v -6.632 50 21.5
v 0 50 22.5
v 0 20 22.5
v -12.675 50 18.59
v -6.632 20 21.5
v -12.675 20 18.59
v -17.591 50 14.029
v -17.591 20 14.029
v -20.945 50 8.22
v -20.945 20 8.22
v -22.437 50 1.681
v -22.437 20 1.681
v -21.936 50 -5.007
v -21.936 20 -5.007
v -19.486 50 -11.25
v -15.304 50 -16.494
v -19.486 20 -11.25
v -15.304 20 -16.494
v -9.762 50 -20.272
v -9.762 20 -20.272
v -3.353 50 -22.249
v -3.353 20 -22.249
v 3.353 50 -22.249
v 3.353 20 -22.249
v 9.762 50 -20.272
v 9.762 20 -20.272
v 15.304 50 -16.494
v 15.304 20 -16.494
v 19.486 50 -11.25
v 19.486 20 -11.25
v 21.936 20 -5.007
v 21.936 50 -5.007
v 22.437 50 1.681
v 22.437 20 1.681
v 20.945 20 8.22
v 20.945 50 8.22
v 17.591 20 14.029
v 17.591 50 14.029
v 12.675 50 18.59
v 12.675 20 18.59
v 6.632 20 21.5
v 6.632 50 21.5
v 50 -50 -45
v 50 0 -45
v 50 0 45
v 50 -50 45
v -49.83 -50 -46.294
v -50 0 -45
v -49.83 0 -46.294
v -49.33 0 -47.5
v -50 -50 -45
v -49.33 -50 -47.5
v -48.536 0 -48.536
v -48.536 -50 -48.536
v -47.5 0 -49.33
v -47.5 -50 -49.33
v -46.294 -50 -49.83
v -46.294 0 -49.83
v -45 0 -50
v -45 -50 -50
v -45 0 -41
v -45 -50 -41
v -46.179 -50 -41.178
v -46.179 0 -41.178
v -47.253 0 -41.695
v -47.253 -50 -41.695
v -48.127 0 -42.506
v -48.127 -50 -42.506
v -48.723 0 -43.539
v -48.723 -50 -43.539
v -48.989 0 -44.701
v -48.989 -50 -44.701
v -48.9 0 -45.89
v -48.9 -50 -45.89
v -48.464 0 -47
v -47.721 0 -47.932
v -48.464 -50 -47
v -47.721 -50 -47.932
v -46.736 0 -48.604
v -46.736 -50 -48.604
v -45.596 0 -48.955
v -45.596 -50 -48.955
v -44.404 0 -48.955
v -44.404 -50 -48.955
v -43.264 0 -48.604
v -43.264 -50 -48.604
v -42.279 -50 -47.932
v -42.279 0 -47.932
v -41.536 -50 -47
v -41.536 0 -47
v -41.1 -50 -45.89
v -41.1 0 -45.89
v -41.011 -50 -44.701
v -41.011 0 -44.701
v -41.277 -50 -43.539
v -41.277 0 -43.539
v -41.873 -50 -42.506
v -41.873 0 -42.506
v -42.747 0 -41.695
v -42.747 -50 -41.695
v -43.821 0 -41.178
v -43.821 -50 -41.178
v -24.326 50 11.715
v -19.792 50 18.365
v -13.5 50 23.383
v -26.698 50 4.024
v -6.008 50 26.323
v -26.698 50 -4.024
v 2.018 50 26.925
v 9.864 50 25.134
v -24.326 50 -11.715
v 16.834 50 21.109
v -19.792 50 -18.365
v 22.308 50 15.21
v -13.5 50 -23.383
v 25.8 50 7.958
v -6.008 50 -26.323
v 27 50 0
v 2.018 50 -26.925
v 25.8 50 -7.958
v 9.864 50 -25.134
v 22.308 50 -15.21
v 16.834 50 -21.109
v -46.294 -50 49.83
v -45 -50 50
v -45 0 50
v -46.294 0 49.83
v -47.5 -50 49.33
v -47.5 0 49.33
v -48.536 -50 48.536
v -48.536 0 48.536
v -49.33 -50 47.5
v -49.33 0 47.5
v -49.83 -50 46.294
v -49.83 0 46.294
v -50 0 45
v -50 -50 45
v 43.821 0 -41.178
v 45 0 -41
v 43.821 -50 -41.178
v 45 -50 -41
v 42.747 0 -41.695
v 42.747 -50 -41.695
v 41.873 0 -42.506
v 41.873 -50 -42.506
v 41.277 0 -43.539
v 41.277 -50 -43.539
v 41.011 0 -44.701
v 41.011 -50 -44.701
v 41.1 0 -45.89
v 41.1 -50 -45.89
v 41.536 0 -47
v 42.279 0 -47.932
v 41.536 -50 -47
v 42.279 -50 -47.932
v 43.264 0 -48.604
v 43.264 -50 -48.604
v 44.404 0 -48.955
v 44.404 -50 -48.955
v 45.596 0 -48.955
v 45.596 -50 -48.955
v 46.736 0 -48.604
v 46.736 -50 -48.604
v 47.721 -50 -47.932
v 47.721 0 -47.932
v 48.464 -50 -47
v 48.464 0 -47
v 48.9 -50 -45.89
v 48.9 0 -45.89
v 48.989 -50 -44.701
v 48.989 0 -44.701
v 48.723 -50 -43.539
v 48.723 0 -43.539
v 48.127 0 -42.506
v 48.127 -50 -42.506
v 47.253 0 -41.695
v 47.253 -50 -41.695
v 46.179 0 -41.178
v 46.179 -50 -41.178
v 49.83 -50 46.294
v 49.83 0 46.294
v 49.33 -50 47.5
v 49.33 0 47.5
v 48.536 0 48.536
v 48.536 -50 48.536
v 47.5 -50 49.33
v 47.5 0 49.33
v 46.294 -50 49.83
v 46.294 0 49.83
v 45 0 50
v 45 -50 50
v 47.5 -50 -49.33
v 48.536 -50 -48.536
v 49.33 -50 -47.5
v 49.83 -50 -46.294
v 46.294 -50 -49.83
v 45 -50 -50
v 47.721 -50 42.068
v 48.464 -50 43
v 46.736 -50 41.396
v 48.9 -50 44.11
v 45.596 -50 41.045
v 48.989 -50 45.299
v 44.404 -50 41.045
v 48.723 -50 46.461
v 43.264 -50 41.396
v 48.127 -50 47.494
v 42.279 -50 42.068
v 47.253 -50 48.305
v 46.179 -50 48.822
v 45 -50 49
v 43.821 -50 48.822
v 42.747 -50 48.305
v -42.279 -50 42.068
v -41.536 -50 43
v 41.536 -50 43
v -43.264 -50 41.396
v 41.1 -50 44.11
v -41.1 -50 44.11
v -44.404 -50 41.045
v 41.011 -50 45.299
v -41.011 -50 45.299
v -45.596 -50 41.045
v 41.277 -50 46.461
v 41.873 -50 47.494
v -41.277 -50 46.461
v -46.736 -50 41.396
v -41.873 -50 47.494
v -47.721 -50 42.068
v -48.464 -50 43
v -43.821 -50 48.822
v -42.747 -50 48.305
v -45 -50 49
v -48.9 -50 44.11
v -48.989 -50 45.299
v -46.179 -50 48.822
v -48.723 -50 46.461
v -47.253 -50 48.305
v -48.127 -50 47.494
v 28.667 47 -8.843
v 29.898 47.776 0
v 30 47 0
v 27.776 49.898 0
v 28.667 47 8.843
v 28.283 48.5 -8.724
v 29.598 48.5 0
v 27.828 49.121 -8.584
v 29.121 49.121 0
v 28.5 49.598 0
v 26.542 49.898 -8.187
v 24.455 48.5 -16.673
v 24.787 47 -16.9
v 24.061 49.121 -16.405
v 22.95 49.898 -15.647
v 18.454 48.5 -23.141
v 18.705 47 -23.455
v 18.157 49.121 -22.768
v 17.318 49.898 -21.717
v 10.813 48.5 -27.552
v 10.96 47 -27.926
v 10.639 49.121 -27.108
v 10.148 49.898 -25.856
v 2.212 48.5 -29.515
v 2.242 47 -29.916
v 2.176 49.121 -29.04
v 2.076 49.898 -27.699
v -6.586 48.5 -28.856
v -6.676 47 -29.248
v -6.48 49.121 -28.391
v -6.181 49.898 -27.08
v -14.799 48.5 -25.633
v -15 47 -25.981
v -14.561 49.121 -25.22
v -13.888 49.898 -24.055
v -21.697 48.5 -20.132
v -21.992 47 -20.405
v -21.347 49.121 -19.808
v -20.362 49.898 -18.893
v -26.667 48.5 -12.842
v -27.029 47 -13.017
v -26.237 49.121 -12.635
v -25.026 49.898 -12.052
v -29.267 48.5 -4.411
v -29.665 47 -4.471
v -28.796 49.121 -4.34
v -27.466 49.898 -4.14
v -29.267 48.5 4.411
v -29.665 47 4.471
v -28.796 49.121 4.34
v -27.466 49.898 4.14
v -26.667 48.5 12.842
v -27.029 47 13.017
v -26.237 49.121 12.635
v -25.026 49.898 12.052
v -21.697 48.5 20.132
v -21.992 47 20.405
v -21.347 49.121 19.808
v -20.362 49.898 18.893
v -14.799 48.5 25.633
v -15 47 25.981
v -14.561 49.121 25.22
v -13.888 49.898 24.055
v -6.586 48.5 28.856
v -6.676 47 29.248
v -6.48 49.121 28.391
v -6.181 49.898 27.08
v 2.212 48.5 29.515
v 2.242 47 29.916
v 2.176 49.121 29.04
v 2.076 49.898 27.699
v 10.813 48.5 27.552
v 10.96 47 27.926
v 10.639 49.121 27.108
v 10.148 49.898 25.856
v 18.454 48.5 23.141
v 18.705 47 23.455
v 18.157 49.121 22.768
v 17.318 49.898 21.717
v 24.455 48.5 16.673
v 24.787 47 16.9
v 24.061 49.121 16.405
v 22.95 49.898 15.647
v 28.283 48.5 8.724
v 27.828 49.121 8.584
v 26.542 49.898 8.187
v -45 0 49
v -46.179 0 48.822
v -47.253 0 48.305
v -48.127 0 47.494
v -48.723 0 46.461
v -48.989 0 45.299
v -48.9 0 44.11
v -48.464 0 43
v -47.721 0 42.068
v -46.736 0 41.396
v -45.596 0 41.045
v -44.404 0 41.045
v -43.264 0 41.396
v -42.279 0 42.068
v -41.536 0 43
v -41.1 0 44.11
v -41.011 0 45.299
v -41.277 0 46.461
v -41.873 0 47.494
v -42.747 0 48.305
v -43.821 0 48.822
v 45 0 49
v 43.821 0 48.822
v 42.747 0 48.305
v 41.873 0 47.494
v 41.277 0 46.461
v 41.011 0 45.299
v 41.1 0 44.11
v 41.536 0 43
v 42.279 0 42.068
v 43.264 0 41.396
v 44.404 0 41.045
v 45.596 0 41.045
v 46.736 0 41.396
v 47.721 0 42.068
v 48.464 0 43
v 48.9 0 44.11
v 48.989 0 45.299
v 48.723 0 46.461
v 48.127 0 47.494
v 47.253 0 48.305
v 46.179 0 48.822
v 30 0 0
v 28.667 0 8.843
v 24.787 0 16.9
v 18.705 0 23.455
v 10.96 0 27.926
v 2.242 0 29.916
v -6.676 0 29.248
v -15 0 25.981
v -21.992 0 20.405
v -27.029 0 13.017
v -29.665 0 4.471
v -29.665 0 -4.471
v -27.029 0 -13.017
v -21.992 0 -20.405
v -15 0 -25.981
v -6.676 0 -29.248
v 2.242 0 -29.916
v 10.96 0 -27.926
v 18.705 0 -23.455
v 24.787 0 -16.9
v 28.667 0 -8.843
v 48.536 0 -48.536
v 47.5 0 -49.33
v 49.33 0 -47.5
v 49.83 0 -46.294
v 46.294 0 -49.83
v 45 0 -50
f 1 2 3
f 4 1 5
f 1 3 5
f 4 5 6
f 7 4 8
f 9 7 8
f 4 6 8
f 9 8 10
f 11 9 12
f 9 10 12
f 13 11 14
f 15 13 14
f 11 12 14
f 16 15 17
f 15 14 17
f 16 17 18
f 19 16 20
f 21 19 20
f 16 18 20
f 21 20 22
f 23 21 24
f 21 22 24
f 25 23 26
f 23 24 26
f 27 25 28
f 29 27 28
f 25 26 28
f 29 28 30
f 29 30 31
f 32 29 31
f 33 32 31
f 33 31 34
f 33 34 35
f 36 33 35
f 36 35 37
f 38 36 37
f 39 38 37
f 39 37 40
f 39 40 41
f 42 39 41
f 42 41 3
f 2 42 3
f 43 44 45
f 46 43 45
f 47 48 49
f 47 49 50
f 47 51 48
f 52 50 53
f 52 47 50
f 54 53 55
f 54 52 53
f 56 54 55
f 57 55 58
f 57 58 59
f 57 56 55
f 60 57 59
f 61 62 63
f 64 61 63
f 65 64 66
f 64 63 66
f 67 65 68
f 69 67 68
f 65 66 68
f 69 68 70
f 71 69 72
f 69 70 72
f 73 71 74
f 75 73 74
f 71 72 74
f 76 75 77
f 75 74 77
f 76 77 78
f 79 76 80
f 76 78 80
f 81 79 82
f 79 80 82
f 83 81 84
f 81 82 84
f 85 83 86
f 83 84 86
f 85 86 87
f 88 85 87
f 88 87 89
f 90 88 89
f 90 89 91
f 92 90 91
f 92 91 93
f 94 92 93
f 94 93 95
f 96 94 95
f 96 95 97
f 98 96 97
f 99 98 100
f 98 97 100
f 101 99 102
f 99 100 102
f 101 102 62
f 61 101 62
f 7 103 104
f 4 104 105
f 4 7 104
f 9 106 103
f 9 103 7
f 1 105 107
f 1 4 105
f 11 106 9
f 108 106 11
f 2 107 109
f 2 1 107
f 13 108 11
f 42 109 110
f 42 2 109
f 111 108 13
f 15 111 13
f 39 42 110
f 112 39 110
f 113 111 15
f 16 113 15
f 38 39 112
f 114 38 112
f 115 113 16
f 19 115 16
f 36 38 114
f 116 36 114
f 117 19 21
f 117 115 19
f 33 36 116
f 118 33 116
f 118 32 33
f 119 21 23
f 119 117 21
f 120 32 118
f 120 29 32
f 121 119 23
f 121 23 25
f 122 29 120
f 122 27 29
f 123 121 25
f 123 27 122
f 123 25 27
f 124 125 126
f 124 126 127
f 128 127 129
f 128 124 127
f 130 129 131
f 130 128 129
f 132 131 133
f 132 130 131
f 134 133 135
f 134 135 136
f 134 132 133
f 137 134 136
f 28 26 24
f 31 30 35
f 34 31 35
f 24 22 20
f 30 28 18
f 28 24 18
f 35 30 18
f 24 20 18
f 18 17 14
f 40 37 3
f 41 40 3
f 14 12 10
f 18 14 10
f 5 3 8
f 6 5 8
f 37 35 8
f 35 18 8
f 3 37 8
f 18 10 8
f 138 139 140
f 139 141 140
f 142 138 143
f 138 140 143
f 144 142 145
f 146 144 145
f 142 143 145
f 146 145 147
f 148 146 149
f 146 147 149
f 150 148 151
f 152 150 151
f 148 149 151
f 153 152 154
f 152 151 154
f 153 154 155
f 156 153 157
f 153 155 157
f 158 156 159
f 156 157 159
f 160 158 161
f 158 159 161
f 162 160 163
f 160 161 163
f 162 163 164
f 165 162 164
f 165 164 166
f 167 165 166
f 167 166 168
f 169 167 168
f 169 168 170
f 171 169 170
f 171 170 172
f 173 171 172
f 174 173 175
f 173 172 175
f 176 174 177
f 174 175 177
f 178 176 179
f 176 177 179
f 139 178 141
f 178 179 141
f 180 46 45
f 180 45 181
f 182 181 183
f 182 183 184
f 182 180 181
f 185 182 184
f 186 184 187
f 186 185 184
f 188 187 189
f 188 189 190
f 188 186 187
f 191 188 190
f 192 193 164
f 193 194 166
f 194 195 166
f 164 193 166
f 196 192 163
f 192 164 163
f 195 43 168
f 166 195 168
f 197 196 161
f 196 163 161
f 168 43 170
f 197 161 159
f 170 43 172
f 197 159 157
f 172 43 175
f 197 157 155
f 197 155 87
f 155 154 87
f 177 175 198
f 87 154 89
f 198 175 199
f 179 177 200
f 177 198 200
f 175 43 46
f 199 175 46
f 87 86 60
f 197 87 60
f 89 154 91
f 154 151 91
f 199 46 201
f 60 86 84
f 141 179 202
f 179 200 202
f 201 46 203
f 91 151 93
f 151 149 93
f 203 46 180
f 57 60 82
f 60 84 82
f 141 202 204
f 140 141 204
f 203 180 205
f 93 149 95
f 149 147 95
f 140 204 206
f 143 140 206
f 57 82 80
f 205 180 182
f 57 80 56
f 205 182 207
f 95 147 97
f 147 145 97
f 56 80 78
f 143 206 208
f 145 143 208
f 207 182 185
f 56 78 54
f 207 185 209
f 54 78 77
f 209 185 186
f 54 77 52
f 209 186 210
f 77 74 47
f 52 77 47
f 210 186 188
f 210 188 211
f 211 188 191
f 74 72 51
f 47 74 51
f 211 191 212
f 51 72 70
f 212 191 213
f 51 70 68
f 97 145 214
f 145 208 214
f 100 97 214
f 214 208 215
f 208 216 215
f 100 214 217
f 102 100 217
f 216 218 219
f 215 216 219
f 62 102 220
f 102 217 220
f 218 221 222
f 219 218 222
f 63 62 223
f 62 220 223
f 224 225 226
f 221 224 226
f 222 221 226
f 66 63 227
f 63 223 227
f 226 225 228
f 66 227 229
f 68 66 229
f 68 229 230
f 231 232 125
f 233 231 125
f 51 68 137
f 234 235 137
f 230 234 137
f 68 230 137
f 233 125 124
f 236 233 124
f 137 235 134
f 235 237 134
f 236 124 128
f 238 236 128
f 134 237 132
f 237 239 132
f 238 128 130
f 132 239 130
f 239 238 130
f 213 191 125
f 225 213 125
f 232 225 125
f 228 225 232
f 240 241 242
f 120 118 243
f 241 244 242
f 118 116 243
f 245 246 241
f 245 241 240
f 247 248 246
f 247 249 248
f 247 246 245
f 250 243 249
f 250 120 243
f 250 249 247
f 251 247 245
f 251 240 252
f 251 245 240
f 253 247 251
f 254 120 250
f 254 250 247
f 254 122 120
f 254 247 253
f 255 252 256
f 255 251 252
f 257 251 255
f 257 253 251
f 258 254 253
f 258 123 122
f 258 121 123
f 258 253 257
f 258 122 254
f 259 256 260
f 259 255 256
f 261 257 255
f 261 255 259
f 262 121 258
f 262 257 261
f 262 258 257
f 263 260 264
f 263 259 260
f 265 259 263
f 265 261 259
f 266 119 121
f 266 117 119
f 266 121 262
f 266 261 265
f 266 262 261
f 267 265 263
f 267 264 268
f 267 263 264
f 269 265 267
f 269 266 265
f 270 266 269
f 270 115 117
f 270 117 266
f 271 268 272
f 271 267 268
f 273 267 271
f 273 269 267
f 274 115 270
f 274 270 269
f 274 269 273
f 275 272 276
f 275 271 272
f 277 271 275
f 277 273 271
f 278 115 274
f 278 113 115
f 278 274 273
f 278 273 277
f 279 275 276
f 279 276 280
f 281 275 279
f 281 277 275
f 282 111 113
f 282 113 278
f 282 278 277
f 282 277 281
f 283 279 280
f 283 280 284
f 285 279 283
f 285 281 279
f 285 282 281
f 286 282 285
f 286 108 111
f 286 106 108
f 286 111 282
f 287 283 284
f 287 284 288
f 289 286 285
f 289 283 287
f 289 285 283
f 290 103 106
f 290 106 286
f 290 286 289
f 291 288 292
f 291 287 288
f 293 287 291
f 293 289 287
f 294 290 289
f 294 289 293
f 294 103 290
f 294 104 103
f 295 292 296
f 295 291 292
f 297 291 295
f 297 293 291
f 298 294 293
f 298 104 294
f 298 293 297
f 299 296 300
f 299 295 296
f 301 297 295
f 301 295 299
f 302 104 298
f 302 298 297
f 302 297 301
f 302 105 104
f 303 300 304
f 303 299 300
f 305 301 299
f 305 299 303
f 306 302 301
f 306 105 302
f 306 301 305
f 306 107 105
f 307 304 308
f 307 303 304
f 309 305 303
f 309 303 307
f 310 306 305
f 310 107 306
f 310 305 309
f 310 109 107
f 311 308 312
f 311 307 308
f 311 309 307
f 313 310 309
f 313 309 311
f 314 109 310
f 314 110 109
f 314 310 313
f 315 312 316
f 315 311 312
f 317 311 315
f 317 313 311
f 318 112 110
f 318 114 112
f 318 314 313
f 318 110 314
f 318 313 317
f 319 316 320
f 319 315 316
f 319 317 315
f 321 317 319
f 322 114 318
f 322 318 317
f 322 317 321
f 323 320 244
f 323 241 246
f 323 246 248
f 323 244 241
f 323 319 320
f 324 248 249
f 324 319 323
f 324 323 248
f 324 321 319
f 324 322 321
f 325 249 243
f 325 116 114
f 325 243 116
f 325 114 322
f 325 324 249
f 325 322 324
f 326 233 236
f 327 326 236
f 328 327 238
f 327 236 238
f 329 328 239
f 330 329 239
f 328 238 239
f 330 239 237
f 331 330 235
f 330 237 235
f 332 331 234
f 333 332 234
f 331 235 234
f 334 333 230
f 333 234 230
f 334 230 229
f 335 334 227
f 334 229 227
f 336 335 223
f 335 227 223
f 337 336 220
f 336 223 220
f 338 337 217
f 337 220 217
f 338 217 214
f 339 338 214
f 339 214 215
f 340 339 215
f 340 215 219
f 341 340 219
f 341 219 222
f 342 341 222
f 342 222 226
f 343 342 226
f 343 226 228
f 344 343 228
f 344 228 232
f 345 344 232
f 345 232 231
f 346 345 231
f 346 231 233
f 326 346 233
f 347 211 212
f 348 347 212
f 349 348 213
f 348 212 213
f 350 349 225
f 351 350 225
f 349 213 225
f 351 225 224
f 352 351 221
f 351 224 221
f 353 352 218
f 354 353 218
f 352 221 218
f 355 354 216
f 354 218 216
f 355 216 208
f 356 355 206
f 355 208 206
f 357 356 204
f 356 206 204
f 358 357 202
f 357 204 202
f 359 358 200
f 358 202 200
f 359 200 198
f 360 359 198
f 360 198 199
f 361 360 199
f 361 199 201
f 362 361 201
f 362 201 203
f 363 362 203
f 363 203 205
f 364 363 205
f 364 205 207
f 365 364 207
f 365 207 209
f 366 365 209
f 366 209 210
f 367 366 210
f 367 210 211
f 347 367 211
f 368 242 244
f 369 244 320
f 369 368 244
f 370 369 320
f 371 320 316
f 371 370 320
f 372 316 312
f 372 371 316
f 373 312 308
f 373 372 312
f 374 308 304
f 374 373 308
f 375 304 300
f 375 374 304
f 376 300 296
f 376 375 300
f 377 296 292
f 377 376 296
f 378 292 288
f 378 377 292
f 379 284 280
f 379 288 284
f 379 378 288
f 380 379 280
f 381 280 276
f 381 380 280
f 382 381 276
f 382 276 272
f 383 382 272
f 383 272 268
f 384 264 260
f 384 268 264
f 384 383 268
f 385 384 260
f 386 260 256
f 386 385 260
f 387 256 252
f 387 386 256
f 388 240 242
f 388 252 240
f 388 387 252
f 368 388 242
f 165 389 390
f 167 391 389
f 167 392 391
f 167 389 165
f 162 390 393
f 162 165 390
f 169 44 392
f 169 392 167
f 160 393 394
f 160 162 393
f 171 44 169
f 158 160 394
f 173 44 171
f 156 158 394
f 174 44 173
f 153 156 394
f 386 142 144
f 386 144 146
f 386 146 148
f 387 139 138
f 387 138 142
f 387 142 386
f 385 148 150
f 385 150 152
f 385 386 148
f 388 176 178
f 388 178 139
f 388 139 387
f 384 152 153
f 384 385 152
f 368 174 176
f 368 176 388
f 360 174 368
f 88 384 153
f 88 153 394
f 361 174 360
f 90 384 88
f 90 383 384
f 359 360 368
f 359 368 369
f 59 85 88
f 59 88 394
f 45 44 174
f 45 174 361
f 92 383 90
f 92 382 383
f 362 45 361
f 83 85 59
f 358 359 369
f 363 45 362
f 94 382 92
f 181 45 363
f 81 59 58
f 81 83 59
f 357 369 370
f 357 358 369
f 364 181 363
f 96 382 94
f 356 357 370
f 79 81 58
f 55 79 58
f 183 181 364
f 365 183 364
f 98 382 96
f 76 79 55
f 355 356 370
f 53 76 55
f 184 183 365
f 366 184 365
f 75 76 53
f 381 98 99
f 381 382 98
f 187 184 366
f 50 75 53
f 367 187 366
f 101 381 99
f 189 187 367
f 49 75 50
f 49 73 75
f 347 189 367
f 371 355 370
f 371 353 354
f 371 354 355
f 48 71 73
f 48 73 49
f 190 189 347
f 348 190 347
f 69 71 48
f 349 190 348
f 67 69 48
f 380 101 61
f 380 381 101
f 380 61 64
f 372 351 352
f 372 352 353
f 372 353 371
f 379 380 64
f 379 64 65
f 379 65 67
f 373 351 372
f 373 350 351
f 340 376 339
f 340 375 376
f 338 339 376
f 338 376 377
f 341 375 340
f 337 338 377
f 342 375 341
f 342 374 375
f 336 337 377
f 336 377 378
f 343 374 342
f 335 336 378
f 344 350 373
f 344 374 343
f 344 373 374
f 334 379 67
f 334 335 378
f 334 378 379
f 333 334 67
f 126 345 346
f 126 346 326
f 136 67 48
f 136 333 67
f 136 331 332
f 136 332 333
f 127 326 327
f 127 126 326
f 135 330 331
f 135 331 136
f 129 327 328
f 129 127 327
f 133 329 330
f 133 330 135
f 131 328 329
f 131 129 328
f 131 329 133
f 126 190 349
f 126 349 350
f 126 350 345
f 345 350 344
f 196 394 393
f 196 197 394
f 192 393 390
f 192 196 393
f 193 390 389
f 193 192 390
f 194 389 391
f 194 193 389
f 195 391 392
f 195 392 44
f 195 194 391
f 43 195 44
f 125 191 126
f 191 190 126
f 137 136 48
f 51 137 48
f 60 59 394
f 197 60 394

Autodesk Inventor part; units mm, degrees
ref_plane "YZ Plane" through (0, 0, 0) normal (1, 0, 0) x (0, 1, 0)
ref_plane "XZ Plane" through (0, 0, 0) normal (0, 1, 0) x (-1, 0, 0)
ref_plane "XY Plane" through (0, 0, 0) normal (0, 0, 1) x (1, 0, 0)
sketch "Sketch1" plane through (0, 0, 0) normal (0, 1, 0) x (-1, 0, 0)
  point P0 (0, 0)
sketch "Sketch2" plane through (0, 0, 0) normal (0, 1, 0) x (-1, 0, 0)
  line L0 (-50, 50) -> (50, 50)
  line L1 (50, 50) -> (50, -50)
  line L2 (50, -50) -> (-50, -50)
  line L3 (-50, -50) -> (-50, 50)
  line L4 (-50, 50) -> (50, -50) construction
  line L5 (50, 50) -> (-50, -50) construction
  point P0 (0, 0)
  dimension "d0" = 100
  dimension "d1" = 100
extrude "Extrusion1" add sketch "Sketch2" against normal blind 50
sketch "Sketch3" plane through (0, 0, 0) normal (0, 1, 0) x (1, 0, 0)
  circle A0 centre (0, 0) radius 30
  dimension "d4" = 60
extrude "Extrusion2" add sketch "Sketch3" along normal blind 50
sketch "Sketch4" plane through (0, 50, 0) normal (0, 1, 0) x (1, 0, 0)
  point P0 (0, 0)
hole "Hole1" at (0, 50, 0) direction (0, -1, 0) diameter 45 depth 30
thread "Thread1" size "M50x4" class "6H" standard "ANSI Metric M Profile" full length
fillet "Fillet1" radius 3 1 edges at (-30, 50, 0)
sketch "Sketch9" plane through (0, 0, 0) normal (0, 1, 0) x (1, 0, 0)
  circle A0 centre (45, 45) radius 4
  circle A1 centre (45, 45) radius 5
  circle A2 centre (45, -45) radius 5
  circle A3 centre (45, -45) radius 4
  circle A4 centre (-45, 45) radius 4
  circle A5 centre (-45, 45) radius 5
  circle A6 centre (-45, -45) radius 4
  circle A7 centre (-45, -45) radius 5
  point P0 (0, 0)
  point P1 (-50, 50)
  point P2 (-50, -50)
fillet "Fillet6" radius 5 1 edges at (-50, -25, 50)
fillet "Fillet7" radius 5 1 edges at (-50, -25, -50)
fillet "Fillet8" radius 5 1 edges at (50, -25, -50)
fillet "Fillet9" radius 5 1 edges at (50, -25, 50)
hole "Hole7" at (45, 0, -45) direction (0, -1, 0) diameter 8 end through all
hole "Hole8" at (45, 0, 45) direction (0, -1, 0) diameter 8 end through all
hole "Hole9" at (-45, 0, 45) direction (0, -1, 0) diameter 8 end through all
hole "Hole10" at (-45, 0, -45) direction (0, -1, 0) diameter 8 end through all
properties part number "Practica1 - Jonnathan Lanuza"
